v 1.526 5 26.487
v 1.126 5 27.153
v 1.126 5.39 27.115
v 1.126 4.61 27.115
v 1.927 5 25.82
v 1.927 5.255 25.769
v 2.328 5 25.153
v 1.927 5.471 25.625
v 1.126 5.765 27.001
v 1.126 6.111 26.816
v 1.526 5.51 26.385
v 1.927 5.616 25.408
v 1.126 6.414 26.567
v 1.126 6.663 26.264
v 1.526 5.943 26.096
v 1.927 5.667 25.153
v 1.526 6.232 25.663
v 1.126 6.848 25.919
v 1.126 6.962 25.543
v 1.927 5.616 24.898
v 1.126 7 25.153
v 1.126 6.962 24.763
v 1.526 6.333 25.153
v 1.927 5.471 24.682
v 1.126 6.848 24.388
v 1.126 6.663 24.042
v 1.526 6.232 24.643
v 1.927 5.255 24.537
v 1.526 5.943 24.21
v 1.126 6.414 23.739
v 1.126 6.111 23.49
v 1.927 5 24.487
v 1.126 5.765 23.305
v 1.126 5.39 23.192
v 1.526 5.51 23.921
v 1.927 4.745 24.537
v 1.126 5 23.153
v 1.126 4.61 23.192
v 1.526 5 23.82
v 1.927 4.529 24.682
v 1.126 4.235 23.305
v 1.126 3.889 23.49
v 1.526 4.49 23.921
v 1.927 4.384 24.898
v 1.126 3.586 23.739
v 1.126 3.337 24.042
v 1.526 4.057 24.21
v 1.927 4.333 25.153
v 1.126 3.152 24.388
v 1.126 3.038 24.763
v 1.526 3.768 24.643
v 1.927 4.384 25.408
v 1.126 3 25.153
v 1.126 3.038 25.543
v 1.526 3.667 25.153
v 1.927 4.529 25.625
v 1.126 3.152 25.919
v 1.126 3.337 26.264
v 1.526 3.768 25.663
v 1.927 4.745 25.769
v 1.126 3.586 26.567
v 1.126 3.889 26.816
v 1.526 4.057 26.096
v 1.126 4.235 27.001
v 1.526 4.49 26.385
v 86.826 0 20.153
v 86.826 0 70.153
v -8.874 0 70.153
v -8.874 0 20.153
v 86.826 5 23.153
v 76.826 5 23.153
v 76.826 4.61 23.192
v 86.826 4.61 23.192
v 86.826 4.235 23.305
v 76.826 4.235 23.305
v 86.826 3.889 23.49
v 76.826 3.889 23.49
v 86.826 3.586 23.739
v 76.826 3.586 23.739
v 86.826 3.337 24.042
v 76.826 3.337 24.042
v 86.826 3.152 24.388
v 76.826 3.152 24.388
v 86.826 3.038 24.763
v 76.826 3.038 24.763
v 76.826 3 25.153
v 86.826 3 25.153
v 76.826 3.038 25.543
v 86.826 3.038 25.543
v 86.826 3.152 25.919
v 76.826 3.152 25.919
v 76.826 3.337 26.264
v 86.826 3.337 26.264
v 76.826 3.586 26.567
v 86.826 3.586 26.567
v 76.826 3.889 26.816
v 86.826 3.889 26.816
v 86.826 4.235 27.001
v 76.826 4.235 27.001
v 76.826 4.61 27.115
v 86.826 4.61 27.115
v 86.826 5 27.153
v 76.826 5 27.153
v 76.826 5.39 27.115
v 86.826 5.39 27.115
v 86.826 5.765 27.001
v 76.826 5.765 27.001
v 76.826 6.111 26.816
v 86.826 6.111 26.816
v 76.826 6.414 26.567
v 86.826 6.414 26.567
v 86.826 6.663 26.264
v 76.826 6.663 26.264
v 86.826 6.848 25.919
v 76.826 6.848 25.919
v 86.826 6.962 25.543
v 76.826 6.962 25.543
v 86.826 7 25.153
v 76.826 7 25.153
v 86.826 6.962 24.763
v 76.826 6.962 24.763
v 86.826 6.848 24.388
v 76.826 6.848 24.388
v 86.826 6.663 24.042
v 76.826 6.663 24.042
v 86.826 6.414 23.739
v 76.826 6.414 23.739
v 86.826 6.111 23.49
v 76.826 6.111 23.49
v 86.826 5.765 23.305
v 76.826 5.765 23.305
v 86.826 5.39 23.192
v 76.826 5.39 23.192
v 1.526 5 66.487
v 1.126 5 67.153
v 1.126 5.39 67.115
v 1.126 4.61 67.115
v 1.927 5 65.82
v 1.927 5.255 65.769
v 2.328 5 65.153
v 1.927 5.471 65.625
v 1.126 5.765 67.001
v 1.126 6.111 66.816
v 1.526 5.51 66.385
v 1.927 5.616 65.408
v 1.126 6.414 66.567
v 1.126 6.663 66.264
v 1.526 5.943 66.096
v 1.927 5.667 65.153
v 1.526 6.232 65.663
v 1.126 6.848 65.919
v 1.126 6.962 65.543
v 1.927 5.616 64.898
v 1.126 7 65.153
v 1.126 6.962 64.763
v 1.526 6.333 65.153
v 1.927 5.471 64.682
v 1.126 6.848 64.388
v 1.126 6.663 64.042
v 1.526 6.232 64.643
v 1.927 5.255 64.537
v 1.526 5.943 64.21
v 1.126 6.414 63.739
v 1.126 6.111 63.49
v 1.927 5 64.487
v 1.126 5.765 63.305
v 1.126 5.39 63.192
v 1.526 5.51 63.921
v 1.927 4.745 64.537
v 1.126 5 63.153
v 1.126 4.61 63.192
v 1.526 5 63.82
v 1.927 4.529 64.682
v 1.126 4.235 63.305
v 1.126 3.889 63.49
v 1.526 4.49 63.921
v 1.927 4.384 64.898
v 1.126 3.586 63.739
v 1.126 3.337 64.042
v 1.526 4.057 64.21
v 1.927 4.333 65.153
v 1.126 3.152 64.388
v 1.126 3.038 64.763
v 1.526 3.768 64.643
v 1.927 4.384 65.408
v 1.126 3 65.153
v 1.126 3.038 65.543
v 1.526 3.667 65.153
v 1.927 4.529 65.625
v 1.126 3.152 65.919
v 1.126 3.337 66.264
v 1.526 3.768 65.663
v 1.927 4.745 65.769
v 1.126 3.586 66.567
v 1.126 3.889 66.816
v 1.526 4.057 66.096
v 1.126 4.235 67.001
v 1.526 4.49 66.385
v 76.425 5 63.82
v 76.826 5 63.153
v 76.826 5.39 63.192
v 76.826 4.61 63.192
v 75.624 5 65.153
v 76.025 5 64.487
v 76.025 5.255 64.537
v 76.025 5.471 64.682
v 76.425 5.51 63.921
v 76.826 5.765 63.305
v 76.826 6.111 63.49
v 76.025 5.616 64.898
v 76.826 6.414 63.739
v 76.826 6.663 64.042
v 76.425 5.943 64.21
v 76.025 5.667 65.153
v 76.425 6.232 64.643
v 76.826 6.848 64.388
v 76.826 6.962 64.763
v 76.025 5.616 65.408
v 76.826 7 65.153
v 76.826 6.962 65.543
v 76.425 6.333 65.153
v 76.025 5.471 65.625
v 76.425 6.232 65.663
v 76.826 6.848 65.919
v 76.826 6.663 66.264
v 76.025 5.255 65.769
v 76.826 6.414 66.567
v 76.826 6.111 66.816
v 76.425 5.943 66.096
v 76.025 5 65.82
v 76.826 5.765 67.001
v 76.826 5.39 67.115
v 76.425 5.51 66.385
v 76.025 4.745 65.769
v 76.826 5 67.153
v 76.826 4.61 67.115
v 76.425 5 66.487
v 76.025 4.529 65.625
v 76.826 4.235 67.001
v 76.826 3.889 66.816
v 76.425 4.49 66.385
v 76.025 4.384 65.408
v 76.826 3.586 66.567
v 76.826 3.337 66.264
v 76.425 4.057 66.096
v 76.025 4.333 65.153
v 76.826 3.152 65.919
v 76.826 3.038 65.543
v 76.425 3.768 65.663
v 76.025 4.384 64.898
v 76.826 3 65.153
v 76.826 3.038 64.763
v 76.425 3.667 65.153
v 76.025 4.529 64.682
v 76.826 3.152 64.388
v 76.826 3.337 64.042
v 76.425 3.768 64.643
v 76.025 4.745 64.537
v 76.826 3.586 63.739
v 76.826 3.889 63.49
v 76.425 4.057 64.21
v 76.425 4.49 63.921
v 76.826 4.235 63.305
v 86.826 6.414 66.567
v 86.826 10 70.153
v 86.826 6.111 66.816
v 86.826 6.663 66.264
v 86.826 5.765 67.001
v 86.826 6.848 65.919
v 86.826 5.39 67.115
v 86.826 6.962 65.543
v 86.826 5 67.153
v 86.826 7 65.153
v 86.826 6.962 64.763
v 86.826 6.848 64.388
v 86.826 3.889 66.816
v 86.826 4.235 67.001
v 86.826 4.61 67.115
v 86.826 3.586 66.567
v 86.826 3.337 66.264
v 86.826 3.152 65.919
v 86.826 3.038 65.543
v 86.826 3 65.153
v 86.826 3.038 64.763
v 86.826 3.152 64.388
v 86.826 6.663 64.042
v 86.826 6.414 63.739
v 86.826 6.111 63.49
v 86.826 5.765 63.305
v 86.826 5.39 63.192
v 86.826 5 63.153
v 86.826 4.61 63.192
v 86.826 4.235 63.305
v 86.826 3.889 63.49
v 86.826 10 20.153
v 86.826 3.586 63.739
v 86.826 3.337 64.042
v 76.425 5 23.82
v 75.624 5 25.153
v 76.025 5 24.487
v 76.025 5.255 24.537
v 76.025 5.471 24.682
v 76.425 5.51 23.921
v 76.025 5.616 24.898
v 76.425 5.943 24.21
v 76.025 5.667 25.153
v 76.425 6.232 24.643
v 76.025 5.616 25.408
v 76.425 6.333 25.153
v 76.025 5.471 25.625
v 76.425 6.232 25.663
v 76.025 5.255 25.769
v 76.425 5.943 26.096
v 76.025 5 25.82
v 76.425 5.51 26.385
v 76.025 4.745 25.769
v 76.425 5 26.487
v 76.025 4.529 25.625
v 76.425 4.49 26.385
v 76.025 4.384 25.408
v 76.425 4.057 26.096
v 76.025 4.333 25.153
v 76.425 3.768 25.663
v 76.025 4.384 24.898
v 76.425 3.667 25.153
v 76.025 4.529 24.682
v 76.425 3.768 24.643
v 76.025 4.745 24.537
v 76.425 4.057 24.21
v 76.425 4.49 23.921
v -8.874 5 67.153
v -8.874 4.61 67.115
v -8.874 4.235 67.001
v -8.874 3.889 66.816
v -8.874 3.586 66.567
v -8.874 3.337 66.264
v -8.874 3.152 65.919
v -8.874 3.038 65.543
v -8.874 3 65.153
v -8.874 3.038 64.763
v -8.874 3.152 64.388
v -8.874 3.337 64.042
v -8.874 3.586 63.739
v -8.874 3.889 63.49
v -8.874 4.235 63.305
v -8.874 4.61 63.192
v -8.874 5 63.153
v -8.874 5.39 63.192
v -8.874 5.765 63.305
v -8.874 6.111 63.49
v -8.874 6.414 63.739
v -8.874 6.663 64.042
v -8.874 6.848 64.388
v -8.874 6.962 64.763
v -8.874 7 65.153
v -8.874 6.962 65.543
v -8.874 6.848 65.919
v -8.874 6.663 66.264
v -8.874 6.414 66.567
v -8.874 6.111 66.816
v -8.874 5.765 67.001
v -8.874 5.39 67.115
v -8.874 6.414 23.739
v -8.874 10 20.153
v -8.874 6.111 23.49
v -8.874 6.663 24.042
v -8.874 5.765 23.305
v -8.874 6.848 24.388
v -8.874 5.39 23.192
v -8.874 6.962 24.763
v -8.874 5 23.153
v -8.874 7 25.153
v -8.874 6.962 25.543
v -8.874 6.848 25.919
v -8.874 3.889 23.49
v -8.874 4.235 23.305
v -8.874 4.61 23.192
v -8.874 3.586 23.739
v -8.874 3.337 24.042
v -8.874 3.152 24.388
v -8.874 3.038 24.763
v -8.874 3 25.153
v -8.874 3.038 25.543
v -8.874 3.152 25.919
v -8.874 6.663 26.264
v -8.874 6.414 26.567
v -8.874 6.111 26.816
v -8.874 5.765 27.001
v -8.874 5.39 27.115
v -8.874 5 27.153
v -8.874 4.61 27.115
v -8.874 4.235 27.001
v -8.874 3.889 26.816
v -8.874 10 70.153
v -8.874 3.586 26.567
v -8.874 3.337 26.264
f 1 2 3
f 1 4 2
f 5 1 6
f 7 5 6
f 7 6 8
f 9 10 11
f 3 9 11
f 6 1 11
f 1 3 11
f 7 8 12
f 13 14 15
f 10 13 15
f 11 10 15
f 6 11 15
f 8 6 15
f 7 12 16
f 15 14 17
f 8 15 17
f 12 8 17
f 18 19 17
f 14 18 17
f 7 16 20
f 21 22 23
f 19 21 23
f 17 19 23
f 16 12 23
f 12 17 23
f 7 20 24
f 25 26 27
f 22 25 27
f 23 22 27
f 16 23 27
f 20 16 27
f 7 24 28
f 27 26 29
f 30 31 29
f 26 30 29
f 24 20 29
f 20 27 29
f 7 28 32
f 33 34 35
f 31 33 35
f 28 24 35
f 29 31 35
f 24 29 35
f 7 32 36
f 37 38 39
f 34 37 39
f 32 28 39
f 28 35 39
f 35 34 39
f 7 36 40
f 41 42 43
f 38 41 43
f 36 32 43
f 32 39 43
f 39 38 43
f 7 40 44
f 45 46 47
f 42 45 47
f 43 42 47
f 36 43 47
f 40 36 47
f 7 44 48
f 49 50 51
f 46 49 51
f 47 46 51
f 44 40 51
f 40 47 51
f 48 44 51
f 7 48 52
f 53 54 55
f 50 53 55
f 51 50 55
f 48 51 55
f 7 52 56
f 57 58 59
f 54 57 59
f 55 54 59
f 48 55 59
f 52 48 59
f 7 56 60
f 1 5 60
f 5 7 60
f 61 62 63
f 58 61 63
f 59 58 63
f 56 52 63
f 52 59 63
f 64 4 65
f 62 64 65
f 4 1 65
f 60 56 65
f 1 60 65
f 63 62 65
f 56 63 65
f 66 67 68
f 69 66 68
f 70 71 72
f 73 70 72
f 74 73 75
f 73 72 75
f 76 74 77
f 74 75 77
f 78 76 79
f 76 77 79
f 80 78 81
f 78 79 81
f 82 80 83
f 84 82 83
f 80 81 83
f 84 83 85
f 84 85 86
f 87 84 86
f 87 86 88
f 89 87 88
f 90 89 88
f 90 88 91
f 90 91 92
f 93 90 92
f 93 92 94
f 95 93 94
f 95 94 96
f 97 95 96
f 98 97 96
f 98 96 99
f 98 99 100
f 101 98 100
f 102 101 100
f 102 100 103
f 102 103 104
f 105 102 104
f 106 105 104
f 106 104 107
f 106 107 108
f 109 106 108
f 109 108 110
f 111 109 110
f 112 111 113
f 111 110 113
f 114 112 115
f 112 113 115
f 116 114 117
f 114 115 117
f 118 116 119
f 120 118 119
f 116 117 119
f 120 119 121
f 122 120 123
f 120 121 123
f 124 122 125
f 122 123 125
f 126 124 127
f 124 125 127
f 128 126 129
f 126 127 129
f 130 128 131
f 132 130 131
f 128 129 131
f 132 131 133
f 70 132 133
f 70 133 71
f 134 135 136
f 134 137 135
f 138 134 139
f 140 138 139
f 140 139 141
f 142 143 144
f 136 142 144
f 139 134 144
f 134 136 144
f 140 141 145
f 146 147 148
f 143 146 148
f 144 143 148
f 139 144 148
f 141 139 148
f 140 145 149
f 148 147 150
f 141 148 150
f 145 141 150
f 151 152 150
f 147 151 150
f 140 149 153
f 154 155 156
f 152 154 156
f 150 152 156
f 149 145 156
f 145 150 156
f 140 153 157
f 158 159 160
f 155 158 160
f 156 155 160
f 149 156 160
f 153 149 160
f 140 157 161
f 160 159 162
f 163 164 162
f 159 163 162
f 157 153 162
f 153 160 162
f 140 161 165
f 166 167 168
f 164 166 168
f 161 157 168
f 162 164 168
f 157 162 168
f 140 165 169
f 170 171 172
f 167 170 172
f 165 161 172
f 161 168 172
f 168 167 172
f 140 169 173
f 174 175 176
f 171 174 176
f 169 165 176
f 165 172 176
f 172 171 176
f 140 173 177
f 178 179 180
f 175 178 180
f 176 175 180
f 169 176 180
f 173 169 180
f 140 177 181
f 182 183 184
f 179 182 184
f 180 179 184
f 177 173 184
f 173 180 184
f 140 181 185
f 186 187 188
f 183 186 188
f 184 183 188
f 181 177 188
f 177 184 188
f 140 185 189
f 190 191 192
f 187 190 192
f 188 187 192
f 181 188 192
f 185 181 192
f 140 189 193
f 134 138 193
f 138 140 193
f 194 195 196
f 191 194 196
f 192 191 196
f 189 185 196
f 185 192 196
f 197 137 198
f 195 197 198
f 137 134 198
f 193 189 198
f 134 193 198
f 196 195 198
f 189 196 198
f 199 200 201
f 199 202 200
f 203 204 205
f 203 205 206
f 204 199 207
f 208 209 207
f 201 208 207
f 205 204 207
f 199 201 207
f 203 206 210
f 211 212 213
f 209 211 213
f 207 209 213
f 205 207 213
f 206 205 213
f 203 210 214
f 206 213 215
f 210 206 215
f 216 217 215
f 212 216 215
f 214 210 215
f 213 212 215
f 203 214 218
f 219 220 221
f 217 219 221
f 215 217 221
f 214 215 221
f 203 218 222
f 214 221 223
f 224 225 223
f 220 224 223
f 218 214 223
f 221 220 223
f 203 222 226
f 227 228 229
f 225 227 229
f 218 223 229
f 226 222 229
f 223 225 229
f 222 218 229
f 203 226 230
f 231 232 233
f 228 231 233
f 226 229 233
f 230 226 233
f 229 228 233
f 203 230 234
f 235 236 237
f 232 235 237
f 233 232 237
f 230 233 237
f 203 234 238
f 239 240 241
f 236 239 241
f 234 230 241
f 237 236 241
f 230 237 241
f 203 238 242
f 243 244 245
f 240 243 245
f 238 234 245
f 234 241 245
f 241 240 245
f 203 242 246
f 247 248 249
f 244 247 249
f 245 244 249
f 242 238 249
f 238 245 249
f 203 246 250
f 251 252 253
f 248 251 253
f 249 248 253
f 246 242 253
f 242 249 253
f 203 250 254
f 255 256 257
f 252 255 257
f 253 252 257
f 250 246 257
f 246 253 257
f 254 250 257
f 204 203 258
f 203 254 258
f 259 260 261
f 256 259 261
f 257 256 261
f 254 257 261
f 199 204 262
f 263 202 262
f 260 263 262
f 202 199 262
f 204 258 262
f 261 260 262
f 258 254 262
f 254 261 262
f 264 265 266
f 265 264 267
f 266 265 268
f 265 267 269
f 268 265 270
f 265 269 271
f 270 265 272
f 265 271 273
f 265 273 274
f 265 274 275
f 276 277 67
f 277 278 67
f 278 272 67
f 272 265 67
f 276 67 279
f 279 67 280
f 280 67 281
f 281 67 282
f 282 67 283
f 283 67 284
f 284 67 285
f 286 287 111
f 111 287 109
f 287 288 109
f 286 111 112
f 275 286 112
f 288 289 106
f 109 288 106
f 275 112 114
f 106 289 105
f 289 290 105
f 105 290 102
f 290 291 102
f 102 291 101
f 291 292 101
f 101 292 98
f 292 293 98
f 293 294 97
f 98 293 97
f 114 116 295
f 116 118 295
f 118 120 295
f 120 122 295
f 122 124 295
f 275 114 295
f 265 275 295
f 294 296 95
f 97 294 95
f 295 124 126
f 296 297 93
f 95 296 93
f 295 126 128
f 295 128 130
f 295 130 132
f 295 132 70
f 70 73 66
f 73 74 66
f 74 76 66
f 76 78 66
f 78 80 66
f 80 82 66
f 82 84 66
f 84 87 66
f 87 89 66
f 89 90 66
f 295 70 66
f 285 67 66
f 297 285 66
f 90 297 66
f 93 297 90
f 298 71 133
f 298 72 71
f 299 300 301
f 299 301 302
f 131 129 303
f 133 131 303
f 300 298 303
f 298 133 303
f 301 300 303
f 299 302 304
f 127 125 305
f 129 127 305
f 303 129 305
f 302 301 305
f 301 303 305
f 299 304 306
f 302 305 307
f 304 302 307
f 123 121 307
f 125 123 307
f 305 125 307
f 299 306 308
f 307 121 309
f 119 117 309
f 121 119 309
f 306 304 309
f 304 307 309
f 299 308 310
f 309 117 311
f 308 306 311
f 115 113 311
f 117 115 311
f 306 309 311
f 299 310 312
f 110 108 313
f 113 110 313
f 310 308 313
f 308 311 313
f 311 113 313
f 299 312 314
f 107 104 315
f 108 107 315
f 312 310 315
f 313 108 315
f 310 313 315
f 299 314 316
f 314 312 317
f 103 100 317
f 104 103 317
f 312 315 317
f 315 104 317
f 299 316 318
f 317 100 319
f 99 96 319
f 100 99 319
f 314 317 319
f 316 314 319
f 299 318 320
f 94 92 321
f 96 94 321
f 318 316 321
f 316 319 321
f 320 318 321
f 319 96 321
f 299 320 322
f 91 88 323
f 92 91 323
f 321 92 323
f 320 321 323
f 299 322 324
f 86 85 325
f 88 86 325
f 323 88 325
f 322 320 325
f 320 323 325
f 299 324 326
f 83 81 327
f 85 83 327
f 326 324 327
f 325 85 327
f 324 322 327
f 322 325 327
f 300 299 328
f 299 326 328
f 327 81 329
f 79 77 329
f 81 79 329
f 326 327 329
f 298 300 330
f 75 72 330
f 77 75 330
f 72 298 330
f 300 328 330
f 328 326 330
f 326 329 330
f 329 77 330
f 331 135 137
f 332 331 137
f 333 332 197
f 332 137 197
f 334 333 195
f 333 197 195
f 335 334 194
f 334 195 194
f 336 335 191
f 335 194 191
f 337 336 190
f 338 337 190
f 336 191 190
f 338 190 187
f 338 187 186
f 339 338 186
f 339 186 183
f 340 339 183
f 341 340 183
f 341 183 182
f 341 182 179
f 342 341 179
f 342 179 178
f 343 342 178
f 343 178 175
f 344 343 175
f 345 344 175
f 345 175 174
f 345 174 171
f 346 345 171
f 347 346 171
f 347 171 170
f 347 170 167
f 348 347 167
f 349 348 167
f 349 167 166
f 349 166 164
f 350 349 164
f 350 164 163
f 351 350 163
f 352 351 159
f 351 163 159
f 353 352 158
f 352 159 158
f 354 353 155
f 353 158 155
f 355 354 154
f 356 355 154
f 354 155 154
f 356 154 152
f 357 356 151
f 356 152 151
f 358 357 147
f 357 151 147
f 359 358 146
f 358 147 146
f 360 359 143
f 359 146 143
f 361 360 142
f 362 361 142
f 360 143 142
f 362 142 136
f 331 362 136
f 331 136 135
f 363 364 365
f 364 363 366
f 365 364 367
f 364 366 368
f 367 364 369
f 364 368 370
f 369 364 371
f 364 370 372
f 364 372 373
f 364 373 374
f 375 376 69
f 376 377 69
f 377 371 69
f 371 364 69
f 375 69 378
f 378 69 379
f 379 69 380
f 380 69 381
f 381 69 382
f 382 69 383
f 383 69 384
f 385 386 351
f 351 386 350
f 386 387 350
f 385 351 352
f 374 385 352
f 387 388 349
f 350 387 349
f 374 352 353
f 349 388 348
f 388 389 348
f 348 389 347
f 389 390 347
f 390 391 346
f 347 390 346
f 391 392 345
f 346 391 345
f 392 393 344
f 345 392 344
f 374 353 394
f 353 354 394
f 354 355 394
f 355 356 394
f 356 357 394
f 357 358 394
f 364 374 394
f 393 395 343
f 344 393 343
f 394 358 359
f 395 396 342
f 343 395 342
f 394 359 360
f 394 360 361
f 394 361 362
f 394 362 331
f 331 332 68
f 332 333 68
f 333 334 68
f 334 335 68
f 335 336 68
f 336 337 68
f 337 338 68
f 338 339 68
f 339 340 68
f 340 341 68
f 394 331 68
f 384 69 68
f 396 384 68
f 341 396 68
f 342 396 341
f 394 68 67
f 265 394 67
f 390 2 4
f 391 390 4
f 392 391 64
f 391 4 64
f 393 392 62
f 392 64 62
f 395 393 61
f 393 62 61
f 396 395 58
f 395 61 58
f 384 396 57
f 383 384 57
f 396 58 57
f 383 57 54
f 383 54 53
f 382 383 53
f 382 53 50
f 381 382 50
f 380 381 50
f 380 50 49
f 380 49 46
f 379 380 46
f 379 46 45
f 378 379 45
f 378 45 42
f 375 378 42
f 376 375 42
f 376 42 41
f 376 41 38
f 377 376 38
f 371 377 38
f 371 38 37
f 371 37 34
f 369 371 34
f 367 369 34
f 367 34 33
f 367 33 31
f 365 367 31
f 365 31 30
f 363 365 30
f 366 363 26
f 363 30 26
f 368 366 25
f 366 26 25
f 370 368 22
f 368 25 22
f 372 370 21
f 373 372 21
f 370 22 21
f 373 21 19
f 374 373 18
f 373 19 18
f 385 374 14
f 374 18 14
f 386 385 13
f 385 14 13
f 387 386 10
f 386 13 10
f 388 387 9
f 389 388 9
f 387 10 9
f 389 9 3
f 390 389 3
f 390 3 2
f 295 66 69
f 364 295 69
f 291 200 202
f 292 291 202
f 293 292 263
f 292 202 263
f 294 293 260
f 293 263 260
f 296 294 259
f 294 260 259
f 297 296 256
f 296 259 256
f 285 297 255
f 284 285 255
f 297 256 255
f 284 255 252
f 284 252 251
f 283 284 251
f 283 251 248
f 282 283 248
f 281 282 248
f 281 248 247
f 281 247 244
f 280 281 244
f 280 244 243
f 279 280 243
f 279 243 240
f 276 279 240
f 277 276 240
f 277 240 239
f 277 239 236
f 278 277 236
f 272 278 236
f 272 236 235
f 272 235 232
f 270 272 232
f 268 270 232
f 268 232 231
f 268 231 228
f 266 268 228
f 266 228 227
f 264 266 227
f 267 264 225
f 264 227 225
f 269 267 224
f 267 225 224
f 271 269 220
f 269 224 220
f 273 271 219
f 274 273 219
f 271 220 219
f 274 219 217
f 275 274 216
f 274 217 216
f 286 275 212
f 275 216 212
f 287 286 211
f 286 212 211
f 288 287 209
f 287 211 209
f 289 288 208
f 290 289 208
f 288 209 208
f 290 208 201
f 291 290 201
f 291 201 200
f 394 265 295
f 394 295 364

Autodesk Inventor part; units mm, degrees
ref_plane "YZ Plane" through (0, 0, 0) normal (1, 0, 0) x (0, 1, 0)
ref_plane "XZ Plane" through (0, 0, 0) normal (0, 1, 0) x (-1, 0, 0)
ref_plane "XY Plane" through (0, 0, 0) normal (0, 0, 1) x (1, 0, 0)
sketch "Boceto1" plane through (0, 0, 0) normal (0, 1, 0) x (-1, 0, 0)
  line L0 (8.8742, 70.1532) -> (-86.8258, 70.1532)
  line L1 (-86.8258, 70.1532) -> (-86.8258, 20.1532)
  line L2 (-86.8258, 20.1532) -> (8.8742, 20.1532)
  line L3 (8.8742, 20.1532) -> (8.8742, 70.1532)
  dimension "d0" = 95.7
  dimension "d1" = 50
extrude "Extrusión1" add sketch "Boceto1" along normal blind 10
sketch "Boceto2" plane through (86.8258, 0, 70.1532) normal (1, 0, 0) x (0, 0, -1)
  line L0 (0, 0) -> (0, 10) projected
  line L1 (50, 0) -> (50, 10) projected
  circle A0 centre (5, 5) radius 2
  circle A1 centre (45, 5) radius 2
  point P0 (70.1532, 0)
  dimension "d4" = 4
  dimension "d5" = 5
  dimension "d6" = 4
  dimension "d7" = 5
sketch "Boceto3" plane through (-8.8742, 0, 20.1532) normal (-1, 0, 0) x (0, 0, 1)
  circle A0 centre (5, 5) radius 2
  line L0 (0, 10) -> (50, 10) projected
  line L1 (0, 0) -> (0, 10) projected
  circle A1 centre (45, 5) radius 2
  line L2 (50, 0) -> (50, 10) projected
  dimension "d8" = 4
  dimension "d9" = 5
  dimension "d10" = 5
  dimension "d11" = 4
  dimension "d12" = 5
  dimension "d13" = 5
hole "Agujero1" at (-8.8742, 5, 25.1532) at (-8.8742, 5, 65.1532) direction (1, 0, 0) diameter 4 depth 10 tip angle 118
hole "Agujero2" at (86.8258, 5, 65.1532) at (86.8258, 5, 25.1532) direction (-1, 0, 0) diameter 4 depth 10 tip angle 118
thread "Rosca1" size "M4x0.7" class "6H" standard "ISO Metric profile" length 7.5
thread "Rosca2" size "M4x0.7" class "6H" standard "ISO Metric profile" length 7.5
thread "Rosca3" size "M4x0.7" class "6H" standard "ISO Metric profile" length 7.5
thread "Rosca4" size "M4x0.7" class "6H" standard "ISO Metric profile" length 7.5
properties part number "Soporte para culata carcasa Derecho" material "Aluminio 6061"
